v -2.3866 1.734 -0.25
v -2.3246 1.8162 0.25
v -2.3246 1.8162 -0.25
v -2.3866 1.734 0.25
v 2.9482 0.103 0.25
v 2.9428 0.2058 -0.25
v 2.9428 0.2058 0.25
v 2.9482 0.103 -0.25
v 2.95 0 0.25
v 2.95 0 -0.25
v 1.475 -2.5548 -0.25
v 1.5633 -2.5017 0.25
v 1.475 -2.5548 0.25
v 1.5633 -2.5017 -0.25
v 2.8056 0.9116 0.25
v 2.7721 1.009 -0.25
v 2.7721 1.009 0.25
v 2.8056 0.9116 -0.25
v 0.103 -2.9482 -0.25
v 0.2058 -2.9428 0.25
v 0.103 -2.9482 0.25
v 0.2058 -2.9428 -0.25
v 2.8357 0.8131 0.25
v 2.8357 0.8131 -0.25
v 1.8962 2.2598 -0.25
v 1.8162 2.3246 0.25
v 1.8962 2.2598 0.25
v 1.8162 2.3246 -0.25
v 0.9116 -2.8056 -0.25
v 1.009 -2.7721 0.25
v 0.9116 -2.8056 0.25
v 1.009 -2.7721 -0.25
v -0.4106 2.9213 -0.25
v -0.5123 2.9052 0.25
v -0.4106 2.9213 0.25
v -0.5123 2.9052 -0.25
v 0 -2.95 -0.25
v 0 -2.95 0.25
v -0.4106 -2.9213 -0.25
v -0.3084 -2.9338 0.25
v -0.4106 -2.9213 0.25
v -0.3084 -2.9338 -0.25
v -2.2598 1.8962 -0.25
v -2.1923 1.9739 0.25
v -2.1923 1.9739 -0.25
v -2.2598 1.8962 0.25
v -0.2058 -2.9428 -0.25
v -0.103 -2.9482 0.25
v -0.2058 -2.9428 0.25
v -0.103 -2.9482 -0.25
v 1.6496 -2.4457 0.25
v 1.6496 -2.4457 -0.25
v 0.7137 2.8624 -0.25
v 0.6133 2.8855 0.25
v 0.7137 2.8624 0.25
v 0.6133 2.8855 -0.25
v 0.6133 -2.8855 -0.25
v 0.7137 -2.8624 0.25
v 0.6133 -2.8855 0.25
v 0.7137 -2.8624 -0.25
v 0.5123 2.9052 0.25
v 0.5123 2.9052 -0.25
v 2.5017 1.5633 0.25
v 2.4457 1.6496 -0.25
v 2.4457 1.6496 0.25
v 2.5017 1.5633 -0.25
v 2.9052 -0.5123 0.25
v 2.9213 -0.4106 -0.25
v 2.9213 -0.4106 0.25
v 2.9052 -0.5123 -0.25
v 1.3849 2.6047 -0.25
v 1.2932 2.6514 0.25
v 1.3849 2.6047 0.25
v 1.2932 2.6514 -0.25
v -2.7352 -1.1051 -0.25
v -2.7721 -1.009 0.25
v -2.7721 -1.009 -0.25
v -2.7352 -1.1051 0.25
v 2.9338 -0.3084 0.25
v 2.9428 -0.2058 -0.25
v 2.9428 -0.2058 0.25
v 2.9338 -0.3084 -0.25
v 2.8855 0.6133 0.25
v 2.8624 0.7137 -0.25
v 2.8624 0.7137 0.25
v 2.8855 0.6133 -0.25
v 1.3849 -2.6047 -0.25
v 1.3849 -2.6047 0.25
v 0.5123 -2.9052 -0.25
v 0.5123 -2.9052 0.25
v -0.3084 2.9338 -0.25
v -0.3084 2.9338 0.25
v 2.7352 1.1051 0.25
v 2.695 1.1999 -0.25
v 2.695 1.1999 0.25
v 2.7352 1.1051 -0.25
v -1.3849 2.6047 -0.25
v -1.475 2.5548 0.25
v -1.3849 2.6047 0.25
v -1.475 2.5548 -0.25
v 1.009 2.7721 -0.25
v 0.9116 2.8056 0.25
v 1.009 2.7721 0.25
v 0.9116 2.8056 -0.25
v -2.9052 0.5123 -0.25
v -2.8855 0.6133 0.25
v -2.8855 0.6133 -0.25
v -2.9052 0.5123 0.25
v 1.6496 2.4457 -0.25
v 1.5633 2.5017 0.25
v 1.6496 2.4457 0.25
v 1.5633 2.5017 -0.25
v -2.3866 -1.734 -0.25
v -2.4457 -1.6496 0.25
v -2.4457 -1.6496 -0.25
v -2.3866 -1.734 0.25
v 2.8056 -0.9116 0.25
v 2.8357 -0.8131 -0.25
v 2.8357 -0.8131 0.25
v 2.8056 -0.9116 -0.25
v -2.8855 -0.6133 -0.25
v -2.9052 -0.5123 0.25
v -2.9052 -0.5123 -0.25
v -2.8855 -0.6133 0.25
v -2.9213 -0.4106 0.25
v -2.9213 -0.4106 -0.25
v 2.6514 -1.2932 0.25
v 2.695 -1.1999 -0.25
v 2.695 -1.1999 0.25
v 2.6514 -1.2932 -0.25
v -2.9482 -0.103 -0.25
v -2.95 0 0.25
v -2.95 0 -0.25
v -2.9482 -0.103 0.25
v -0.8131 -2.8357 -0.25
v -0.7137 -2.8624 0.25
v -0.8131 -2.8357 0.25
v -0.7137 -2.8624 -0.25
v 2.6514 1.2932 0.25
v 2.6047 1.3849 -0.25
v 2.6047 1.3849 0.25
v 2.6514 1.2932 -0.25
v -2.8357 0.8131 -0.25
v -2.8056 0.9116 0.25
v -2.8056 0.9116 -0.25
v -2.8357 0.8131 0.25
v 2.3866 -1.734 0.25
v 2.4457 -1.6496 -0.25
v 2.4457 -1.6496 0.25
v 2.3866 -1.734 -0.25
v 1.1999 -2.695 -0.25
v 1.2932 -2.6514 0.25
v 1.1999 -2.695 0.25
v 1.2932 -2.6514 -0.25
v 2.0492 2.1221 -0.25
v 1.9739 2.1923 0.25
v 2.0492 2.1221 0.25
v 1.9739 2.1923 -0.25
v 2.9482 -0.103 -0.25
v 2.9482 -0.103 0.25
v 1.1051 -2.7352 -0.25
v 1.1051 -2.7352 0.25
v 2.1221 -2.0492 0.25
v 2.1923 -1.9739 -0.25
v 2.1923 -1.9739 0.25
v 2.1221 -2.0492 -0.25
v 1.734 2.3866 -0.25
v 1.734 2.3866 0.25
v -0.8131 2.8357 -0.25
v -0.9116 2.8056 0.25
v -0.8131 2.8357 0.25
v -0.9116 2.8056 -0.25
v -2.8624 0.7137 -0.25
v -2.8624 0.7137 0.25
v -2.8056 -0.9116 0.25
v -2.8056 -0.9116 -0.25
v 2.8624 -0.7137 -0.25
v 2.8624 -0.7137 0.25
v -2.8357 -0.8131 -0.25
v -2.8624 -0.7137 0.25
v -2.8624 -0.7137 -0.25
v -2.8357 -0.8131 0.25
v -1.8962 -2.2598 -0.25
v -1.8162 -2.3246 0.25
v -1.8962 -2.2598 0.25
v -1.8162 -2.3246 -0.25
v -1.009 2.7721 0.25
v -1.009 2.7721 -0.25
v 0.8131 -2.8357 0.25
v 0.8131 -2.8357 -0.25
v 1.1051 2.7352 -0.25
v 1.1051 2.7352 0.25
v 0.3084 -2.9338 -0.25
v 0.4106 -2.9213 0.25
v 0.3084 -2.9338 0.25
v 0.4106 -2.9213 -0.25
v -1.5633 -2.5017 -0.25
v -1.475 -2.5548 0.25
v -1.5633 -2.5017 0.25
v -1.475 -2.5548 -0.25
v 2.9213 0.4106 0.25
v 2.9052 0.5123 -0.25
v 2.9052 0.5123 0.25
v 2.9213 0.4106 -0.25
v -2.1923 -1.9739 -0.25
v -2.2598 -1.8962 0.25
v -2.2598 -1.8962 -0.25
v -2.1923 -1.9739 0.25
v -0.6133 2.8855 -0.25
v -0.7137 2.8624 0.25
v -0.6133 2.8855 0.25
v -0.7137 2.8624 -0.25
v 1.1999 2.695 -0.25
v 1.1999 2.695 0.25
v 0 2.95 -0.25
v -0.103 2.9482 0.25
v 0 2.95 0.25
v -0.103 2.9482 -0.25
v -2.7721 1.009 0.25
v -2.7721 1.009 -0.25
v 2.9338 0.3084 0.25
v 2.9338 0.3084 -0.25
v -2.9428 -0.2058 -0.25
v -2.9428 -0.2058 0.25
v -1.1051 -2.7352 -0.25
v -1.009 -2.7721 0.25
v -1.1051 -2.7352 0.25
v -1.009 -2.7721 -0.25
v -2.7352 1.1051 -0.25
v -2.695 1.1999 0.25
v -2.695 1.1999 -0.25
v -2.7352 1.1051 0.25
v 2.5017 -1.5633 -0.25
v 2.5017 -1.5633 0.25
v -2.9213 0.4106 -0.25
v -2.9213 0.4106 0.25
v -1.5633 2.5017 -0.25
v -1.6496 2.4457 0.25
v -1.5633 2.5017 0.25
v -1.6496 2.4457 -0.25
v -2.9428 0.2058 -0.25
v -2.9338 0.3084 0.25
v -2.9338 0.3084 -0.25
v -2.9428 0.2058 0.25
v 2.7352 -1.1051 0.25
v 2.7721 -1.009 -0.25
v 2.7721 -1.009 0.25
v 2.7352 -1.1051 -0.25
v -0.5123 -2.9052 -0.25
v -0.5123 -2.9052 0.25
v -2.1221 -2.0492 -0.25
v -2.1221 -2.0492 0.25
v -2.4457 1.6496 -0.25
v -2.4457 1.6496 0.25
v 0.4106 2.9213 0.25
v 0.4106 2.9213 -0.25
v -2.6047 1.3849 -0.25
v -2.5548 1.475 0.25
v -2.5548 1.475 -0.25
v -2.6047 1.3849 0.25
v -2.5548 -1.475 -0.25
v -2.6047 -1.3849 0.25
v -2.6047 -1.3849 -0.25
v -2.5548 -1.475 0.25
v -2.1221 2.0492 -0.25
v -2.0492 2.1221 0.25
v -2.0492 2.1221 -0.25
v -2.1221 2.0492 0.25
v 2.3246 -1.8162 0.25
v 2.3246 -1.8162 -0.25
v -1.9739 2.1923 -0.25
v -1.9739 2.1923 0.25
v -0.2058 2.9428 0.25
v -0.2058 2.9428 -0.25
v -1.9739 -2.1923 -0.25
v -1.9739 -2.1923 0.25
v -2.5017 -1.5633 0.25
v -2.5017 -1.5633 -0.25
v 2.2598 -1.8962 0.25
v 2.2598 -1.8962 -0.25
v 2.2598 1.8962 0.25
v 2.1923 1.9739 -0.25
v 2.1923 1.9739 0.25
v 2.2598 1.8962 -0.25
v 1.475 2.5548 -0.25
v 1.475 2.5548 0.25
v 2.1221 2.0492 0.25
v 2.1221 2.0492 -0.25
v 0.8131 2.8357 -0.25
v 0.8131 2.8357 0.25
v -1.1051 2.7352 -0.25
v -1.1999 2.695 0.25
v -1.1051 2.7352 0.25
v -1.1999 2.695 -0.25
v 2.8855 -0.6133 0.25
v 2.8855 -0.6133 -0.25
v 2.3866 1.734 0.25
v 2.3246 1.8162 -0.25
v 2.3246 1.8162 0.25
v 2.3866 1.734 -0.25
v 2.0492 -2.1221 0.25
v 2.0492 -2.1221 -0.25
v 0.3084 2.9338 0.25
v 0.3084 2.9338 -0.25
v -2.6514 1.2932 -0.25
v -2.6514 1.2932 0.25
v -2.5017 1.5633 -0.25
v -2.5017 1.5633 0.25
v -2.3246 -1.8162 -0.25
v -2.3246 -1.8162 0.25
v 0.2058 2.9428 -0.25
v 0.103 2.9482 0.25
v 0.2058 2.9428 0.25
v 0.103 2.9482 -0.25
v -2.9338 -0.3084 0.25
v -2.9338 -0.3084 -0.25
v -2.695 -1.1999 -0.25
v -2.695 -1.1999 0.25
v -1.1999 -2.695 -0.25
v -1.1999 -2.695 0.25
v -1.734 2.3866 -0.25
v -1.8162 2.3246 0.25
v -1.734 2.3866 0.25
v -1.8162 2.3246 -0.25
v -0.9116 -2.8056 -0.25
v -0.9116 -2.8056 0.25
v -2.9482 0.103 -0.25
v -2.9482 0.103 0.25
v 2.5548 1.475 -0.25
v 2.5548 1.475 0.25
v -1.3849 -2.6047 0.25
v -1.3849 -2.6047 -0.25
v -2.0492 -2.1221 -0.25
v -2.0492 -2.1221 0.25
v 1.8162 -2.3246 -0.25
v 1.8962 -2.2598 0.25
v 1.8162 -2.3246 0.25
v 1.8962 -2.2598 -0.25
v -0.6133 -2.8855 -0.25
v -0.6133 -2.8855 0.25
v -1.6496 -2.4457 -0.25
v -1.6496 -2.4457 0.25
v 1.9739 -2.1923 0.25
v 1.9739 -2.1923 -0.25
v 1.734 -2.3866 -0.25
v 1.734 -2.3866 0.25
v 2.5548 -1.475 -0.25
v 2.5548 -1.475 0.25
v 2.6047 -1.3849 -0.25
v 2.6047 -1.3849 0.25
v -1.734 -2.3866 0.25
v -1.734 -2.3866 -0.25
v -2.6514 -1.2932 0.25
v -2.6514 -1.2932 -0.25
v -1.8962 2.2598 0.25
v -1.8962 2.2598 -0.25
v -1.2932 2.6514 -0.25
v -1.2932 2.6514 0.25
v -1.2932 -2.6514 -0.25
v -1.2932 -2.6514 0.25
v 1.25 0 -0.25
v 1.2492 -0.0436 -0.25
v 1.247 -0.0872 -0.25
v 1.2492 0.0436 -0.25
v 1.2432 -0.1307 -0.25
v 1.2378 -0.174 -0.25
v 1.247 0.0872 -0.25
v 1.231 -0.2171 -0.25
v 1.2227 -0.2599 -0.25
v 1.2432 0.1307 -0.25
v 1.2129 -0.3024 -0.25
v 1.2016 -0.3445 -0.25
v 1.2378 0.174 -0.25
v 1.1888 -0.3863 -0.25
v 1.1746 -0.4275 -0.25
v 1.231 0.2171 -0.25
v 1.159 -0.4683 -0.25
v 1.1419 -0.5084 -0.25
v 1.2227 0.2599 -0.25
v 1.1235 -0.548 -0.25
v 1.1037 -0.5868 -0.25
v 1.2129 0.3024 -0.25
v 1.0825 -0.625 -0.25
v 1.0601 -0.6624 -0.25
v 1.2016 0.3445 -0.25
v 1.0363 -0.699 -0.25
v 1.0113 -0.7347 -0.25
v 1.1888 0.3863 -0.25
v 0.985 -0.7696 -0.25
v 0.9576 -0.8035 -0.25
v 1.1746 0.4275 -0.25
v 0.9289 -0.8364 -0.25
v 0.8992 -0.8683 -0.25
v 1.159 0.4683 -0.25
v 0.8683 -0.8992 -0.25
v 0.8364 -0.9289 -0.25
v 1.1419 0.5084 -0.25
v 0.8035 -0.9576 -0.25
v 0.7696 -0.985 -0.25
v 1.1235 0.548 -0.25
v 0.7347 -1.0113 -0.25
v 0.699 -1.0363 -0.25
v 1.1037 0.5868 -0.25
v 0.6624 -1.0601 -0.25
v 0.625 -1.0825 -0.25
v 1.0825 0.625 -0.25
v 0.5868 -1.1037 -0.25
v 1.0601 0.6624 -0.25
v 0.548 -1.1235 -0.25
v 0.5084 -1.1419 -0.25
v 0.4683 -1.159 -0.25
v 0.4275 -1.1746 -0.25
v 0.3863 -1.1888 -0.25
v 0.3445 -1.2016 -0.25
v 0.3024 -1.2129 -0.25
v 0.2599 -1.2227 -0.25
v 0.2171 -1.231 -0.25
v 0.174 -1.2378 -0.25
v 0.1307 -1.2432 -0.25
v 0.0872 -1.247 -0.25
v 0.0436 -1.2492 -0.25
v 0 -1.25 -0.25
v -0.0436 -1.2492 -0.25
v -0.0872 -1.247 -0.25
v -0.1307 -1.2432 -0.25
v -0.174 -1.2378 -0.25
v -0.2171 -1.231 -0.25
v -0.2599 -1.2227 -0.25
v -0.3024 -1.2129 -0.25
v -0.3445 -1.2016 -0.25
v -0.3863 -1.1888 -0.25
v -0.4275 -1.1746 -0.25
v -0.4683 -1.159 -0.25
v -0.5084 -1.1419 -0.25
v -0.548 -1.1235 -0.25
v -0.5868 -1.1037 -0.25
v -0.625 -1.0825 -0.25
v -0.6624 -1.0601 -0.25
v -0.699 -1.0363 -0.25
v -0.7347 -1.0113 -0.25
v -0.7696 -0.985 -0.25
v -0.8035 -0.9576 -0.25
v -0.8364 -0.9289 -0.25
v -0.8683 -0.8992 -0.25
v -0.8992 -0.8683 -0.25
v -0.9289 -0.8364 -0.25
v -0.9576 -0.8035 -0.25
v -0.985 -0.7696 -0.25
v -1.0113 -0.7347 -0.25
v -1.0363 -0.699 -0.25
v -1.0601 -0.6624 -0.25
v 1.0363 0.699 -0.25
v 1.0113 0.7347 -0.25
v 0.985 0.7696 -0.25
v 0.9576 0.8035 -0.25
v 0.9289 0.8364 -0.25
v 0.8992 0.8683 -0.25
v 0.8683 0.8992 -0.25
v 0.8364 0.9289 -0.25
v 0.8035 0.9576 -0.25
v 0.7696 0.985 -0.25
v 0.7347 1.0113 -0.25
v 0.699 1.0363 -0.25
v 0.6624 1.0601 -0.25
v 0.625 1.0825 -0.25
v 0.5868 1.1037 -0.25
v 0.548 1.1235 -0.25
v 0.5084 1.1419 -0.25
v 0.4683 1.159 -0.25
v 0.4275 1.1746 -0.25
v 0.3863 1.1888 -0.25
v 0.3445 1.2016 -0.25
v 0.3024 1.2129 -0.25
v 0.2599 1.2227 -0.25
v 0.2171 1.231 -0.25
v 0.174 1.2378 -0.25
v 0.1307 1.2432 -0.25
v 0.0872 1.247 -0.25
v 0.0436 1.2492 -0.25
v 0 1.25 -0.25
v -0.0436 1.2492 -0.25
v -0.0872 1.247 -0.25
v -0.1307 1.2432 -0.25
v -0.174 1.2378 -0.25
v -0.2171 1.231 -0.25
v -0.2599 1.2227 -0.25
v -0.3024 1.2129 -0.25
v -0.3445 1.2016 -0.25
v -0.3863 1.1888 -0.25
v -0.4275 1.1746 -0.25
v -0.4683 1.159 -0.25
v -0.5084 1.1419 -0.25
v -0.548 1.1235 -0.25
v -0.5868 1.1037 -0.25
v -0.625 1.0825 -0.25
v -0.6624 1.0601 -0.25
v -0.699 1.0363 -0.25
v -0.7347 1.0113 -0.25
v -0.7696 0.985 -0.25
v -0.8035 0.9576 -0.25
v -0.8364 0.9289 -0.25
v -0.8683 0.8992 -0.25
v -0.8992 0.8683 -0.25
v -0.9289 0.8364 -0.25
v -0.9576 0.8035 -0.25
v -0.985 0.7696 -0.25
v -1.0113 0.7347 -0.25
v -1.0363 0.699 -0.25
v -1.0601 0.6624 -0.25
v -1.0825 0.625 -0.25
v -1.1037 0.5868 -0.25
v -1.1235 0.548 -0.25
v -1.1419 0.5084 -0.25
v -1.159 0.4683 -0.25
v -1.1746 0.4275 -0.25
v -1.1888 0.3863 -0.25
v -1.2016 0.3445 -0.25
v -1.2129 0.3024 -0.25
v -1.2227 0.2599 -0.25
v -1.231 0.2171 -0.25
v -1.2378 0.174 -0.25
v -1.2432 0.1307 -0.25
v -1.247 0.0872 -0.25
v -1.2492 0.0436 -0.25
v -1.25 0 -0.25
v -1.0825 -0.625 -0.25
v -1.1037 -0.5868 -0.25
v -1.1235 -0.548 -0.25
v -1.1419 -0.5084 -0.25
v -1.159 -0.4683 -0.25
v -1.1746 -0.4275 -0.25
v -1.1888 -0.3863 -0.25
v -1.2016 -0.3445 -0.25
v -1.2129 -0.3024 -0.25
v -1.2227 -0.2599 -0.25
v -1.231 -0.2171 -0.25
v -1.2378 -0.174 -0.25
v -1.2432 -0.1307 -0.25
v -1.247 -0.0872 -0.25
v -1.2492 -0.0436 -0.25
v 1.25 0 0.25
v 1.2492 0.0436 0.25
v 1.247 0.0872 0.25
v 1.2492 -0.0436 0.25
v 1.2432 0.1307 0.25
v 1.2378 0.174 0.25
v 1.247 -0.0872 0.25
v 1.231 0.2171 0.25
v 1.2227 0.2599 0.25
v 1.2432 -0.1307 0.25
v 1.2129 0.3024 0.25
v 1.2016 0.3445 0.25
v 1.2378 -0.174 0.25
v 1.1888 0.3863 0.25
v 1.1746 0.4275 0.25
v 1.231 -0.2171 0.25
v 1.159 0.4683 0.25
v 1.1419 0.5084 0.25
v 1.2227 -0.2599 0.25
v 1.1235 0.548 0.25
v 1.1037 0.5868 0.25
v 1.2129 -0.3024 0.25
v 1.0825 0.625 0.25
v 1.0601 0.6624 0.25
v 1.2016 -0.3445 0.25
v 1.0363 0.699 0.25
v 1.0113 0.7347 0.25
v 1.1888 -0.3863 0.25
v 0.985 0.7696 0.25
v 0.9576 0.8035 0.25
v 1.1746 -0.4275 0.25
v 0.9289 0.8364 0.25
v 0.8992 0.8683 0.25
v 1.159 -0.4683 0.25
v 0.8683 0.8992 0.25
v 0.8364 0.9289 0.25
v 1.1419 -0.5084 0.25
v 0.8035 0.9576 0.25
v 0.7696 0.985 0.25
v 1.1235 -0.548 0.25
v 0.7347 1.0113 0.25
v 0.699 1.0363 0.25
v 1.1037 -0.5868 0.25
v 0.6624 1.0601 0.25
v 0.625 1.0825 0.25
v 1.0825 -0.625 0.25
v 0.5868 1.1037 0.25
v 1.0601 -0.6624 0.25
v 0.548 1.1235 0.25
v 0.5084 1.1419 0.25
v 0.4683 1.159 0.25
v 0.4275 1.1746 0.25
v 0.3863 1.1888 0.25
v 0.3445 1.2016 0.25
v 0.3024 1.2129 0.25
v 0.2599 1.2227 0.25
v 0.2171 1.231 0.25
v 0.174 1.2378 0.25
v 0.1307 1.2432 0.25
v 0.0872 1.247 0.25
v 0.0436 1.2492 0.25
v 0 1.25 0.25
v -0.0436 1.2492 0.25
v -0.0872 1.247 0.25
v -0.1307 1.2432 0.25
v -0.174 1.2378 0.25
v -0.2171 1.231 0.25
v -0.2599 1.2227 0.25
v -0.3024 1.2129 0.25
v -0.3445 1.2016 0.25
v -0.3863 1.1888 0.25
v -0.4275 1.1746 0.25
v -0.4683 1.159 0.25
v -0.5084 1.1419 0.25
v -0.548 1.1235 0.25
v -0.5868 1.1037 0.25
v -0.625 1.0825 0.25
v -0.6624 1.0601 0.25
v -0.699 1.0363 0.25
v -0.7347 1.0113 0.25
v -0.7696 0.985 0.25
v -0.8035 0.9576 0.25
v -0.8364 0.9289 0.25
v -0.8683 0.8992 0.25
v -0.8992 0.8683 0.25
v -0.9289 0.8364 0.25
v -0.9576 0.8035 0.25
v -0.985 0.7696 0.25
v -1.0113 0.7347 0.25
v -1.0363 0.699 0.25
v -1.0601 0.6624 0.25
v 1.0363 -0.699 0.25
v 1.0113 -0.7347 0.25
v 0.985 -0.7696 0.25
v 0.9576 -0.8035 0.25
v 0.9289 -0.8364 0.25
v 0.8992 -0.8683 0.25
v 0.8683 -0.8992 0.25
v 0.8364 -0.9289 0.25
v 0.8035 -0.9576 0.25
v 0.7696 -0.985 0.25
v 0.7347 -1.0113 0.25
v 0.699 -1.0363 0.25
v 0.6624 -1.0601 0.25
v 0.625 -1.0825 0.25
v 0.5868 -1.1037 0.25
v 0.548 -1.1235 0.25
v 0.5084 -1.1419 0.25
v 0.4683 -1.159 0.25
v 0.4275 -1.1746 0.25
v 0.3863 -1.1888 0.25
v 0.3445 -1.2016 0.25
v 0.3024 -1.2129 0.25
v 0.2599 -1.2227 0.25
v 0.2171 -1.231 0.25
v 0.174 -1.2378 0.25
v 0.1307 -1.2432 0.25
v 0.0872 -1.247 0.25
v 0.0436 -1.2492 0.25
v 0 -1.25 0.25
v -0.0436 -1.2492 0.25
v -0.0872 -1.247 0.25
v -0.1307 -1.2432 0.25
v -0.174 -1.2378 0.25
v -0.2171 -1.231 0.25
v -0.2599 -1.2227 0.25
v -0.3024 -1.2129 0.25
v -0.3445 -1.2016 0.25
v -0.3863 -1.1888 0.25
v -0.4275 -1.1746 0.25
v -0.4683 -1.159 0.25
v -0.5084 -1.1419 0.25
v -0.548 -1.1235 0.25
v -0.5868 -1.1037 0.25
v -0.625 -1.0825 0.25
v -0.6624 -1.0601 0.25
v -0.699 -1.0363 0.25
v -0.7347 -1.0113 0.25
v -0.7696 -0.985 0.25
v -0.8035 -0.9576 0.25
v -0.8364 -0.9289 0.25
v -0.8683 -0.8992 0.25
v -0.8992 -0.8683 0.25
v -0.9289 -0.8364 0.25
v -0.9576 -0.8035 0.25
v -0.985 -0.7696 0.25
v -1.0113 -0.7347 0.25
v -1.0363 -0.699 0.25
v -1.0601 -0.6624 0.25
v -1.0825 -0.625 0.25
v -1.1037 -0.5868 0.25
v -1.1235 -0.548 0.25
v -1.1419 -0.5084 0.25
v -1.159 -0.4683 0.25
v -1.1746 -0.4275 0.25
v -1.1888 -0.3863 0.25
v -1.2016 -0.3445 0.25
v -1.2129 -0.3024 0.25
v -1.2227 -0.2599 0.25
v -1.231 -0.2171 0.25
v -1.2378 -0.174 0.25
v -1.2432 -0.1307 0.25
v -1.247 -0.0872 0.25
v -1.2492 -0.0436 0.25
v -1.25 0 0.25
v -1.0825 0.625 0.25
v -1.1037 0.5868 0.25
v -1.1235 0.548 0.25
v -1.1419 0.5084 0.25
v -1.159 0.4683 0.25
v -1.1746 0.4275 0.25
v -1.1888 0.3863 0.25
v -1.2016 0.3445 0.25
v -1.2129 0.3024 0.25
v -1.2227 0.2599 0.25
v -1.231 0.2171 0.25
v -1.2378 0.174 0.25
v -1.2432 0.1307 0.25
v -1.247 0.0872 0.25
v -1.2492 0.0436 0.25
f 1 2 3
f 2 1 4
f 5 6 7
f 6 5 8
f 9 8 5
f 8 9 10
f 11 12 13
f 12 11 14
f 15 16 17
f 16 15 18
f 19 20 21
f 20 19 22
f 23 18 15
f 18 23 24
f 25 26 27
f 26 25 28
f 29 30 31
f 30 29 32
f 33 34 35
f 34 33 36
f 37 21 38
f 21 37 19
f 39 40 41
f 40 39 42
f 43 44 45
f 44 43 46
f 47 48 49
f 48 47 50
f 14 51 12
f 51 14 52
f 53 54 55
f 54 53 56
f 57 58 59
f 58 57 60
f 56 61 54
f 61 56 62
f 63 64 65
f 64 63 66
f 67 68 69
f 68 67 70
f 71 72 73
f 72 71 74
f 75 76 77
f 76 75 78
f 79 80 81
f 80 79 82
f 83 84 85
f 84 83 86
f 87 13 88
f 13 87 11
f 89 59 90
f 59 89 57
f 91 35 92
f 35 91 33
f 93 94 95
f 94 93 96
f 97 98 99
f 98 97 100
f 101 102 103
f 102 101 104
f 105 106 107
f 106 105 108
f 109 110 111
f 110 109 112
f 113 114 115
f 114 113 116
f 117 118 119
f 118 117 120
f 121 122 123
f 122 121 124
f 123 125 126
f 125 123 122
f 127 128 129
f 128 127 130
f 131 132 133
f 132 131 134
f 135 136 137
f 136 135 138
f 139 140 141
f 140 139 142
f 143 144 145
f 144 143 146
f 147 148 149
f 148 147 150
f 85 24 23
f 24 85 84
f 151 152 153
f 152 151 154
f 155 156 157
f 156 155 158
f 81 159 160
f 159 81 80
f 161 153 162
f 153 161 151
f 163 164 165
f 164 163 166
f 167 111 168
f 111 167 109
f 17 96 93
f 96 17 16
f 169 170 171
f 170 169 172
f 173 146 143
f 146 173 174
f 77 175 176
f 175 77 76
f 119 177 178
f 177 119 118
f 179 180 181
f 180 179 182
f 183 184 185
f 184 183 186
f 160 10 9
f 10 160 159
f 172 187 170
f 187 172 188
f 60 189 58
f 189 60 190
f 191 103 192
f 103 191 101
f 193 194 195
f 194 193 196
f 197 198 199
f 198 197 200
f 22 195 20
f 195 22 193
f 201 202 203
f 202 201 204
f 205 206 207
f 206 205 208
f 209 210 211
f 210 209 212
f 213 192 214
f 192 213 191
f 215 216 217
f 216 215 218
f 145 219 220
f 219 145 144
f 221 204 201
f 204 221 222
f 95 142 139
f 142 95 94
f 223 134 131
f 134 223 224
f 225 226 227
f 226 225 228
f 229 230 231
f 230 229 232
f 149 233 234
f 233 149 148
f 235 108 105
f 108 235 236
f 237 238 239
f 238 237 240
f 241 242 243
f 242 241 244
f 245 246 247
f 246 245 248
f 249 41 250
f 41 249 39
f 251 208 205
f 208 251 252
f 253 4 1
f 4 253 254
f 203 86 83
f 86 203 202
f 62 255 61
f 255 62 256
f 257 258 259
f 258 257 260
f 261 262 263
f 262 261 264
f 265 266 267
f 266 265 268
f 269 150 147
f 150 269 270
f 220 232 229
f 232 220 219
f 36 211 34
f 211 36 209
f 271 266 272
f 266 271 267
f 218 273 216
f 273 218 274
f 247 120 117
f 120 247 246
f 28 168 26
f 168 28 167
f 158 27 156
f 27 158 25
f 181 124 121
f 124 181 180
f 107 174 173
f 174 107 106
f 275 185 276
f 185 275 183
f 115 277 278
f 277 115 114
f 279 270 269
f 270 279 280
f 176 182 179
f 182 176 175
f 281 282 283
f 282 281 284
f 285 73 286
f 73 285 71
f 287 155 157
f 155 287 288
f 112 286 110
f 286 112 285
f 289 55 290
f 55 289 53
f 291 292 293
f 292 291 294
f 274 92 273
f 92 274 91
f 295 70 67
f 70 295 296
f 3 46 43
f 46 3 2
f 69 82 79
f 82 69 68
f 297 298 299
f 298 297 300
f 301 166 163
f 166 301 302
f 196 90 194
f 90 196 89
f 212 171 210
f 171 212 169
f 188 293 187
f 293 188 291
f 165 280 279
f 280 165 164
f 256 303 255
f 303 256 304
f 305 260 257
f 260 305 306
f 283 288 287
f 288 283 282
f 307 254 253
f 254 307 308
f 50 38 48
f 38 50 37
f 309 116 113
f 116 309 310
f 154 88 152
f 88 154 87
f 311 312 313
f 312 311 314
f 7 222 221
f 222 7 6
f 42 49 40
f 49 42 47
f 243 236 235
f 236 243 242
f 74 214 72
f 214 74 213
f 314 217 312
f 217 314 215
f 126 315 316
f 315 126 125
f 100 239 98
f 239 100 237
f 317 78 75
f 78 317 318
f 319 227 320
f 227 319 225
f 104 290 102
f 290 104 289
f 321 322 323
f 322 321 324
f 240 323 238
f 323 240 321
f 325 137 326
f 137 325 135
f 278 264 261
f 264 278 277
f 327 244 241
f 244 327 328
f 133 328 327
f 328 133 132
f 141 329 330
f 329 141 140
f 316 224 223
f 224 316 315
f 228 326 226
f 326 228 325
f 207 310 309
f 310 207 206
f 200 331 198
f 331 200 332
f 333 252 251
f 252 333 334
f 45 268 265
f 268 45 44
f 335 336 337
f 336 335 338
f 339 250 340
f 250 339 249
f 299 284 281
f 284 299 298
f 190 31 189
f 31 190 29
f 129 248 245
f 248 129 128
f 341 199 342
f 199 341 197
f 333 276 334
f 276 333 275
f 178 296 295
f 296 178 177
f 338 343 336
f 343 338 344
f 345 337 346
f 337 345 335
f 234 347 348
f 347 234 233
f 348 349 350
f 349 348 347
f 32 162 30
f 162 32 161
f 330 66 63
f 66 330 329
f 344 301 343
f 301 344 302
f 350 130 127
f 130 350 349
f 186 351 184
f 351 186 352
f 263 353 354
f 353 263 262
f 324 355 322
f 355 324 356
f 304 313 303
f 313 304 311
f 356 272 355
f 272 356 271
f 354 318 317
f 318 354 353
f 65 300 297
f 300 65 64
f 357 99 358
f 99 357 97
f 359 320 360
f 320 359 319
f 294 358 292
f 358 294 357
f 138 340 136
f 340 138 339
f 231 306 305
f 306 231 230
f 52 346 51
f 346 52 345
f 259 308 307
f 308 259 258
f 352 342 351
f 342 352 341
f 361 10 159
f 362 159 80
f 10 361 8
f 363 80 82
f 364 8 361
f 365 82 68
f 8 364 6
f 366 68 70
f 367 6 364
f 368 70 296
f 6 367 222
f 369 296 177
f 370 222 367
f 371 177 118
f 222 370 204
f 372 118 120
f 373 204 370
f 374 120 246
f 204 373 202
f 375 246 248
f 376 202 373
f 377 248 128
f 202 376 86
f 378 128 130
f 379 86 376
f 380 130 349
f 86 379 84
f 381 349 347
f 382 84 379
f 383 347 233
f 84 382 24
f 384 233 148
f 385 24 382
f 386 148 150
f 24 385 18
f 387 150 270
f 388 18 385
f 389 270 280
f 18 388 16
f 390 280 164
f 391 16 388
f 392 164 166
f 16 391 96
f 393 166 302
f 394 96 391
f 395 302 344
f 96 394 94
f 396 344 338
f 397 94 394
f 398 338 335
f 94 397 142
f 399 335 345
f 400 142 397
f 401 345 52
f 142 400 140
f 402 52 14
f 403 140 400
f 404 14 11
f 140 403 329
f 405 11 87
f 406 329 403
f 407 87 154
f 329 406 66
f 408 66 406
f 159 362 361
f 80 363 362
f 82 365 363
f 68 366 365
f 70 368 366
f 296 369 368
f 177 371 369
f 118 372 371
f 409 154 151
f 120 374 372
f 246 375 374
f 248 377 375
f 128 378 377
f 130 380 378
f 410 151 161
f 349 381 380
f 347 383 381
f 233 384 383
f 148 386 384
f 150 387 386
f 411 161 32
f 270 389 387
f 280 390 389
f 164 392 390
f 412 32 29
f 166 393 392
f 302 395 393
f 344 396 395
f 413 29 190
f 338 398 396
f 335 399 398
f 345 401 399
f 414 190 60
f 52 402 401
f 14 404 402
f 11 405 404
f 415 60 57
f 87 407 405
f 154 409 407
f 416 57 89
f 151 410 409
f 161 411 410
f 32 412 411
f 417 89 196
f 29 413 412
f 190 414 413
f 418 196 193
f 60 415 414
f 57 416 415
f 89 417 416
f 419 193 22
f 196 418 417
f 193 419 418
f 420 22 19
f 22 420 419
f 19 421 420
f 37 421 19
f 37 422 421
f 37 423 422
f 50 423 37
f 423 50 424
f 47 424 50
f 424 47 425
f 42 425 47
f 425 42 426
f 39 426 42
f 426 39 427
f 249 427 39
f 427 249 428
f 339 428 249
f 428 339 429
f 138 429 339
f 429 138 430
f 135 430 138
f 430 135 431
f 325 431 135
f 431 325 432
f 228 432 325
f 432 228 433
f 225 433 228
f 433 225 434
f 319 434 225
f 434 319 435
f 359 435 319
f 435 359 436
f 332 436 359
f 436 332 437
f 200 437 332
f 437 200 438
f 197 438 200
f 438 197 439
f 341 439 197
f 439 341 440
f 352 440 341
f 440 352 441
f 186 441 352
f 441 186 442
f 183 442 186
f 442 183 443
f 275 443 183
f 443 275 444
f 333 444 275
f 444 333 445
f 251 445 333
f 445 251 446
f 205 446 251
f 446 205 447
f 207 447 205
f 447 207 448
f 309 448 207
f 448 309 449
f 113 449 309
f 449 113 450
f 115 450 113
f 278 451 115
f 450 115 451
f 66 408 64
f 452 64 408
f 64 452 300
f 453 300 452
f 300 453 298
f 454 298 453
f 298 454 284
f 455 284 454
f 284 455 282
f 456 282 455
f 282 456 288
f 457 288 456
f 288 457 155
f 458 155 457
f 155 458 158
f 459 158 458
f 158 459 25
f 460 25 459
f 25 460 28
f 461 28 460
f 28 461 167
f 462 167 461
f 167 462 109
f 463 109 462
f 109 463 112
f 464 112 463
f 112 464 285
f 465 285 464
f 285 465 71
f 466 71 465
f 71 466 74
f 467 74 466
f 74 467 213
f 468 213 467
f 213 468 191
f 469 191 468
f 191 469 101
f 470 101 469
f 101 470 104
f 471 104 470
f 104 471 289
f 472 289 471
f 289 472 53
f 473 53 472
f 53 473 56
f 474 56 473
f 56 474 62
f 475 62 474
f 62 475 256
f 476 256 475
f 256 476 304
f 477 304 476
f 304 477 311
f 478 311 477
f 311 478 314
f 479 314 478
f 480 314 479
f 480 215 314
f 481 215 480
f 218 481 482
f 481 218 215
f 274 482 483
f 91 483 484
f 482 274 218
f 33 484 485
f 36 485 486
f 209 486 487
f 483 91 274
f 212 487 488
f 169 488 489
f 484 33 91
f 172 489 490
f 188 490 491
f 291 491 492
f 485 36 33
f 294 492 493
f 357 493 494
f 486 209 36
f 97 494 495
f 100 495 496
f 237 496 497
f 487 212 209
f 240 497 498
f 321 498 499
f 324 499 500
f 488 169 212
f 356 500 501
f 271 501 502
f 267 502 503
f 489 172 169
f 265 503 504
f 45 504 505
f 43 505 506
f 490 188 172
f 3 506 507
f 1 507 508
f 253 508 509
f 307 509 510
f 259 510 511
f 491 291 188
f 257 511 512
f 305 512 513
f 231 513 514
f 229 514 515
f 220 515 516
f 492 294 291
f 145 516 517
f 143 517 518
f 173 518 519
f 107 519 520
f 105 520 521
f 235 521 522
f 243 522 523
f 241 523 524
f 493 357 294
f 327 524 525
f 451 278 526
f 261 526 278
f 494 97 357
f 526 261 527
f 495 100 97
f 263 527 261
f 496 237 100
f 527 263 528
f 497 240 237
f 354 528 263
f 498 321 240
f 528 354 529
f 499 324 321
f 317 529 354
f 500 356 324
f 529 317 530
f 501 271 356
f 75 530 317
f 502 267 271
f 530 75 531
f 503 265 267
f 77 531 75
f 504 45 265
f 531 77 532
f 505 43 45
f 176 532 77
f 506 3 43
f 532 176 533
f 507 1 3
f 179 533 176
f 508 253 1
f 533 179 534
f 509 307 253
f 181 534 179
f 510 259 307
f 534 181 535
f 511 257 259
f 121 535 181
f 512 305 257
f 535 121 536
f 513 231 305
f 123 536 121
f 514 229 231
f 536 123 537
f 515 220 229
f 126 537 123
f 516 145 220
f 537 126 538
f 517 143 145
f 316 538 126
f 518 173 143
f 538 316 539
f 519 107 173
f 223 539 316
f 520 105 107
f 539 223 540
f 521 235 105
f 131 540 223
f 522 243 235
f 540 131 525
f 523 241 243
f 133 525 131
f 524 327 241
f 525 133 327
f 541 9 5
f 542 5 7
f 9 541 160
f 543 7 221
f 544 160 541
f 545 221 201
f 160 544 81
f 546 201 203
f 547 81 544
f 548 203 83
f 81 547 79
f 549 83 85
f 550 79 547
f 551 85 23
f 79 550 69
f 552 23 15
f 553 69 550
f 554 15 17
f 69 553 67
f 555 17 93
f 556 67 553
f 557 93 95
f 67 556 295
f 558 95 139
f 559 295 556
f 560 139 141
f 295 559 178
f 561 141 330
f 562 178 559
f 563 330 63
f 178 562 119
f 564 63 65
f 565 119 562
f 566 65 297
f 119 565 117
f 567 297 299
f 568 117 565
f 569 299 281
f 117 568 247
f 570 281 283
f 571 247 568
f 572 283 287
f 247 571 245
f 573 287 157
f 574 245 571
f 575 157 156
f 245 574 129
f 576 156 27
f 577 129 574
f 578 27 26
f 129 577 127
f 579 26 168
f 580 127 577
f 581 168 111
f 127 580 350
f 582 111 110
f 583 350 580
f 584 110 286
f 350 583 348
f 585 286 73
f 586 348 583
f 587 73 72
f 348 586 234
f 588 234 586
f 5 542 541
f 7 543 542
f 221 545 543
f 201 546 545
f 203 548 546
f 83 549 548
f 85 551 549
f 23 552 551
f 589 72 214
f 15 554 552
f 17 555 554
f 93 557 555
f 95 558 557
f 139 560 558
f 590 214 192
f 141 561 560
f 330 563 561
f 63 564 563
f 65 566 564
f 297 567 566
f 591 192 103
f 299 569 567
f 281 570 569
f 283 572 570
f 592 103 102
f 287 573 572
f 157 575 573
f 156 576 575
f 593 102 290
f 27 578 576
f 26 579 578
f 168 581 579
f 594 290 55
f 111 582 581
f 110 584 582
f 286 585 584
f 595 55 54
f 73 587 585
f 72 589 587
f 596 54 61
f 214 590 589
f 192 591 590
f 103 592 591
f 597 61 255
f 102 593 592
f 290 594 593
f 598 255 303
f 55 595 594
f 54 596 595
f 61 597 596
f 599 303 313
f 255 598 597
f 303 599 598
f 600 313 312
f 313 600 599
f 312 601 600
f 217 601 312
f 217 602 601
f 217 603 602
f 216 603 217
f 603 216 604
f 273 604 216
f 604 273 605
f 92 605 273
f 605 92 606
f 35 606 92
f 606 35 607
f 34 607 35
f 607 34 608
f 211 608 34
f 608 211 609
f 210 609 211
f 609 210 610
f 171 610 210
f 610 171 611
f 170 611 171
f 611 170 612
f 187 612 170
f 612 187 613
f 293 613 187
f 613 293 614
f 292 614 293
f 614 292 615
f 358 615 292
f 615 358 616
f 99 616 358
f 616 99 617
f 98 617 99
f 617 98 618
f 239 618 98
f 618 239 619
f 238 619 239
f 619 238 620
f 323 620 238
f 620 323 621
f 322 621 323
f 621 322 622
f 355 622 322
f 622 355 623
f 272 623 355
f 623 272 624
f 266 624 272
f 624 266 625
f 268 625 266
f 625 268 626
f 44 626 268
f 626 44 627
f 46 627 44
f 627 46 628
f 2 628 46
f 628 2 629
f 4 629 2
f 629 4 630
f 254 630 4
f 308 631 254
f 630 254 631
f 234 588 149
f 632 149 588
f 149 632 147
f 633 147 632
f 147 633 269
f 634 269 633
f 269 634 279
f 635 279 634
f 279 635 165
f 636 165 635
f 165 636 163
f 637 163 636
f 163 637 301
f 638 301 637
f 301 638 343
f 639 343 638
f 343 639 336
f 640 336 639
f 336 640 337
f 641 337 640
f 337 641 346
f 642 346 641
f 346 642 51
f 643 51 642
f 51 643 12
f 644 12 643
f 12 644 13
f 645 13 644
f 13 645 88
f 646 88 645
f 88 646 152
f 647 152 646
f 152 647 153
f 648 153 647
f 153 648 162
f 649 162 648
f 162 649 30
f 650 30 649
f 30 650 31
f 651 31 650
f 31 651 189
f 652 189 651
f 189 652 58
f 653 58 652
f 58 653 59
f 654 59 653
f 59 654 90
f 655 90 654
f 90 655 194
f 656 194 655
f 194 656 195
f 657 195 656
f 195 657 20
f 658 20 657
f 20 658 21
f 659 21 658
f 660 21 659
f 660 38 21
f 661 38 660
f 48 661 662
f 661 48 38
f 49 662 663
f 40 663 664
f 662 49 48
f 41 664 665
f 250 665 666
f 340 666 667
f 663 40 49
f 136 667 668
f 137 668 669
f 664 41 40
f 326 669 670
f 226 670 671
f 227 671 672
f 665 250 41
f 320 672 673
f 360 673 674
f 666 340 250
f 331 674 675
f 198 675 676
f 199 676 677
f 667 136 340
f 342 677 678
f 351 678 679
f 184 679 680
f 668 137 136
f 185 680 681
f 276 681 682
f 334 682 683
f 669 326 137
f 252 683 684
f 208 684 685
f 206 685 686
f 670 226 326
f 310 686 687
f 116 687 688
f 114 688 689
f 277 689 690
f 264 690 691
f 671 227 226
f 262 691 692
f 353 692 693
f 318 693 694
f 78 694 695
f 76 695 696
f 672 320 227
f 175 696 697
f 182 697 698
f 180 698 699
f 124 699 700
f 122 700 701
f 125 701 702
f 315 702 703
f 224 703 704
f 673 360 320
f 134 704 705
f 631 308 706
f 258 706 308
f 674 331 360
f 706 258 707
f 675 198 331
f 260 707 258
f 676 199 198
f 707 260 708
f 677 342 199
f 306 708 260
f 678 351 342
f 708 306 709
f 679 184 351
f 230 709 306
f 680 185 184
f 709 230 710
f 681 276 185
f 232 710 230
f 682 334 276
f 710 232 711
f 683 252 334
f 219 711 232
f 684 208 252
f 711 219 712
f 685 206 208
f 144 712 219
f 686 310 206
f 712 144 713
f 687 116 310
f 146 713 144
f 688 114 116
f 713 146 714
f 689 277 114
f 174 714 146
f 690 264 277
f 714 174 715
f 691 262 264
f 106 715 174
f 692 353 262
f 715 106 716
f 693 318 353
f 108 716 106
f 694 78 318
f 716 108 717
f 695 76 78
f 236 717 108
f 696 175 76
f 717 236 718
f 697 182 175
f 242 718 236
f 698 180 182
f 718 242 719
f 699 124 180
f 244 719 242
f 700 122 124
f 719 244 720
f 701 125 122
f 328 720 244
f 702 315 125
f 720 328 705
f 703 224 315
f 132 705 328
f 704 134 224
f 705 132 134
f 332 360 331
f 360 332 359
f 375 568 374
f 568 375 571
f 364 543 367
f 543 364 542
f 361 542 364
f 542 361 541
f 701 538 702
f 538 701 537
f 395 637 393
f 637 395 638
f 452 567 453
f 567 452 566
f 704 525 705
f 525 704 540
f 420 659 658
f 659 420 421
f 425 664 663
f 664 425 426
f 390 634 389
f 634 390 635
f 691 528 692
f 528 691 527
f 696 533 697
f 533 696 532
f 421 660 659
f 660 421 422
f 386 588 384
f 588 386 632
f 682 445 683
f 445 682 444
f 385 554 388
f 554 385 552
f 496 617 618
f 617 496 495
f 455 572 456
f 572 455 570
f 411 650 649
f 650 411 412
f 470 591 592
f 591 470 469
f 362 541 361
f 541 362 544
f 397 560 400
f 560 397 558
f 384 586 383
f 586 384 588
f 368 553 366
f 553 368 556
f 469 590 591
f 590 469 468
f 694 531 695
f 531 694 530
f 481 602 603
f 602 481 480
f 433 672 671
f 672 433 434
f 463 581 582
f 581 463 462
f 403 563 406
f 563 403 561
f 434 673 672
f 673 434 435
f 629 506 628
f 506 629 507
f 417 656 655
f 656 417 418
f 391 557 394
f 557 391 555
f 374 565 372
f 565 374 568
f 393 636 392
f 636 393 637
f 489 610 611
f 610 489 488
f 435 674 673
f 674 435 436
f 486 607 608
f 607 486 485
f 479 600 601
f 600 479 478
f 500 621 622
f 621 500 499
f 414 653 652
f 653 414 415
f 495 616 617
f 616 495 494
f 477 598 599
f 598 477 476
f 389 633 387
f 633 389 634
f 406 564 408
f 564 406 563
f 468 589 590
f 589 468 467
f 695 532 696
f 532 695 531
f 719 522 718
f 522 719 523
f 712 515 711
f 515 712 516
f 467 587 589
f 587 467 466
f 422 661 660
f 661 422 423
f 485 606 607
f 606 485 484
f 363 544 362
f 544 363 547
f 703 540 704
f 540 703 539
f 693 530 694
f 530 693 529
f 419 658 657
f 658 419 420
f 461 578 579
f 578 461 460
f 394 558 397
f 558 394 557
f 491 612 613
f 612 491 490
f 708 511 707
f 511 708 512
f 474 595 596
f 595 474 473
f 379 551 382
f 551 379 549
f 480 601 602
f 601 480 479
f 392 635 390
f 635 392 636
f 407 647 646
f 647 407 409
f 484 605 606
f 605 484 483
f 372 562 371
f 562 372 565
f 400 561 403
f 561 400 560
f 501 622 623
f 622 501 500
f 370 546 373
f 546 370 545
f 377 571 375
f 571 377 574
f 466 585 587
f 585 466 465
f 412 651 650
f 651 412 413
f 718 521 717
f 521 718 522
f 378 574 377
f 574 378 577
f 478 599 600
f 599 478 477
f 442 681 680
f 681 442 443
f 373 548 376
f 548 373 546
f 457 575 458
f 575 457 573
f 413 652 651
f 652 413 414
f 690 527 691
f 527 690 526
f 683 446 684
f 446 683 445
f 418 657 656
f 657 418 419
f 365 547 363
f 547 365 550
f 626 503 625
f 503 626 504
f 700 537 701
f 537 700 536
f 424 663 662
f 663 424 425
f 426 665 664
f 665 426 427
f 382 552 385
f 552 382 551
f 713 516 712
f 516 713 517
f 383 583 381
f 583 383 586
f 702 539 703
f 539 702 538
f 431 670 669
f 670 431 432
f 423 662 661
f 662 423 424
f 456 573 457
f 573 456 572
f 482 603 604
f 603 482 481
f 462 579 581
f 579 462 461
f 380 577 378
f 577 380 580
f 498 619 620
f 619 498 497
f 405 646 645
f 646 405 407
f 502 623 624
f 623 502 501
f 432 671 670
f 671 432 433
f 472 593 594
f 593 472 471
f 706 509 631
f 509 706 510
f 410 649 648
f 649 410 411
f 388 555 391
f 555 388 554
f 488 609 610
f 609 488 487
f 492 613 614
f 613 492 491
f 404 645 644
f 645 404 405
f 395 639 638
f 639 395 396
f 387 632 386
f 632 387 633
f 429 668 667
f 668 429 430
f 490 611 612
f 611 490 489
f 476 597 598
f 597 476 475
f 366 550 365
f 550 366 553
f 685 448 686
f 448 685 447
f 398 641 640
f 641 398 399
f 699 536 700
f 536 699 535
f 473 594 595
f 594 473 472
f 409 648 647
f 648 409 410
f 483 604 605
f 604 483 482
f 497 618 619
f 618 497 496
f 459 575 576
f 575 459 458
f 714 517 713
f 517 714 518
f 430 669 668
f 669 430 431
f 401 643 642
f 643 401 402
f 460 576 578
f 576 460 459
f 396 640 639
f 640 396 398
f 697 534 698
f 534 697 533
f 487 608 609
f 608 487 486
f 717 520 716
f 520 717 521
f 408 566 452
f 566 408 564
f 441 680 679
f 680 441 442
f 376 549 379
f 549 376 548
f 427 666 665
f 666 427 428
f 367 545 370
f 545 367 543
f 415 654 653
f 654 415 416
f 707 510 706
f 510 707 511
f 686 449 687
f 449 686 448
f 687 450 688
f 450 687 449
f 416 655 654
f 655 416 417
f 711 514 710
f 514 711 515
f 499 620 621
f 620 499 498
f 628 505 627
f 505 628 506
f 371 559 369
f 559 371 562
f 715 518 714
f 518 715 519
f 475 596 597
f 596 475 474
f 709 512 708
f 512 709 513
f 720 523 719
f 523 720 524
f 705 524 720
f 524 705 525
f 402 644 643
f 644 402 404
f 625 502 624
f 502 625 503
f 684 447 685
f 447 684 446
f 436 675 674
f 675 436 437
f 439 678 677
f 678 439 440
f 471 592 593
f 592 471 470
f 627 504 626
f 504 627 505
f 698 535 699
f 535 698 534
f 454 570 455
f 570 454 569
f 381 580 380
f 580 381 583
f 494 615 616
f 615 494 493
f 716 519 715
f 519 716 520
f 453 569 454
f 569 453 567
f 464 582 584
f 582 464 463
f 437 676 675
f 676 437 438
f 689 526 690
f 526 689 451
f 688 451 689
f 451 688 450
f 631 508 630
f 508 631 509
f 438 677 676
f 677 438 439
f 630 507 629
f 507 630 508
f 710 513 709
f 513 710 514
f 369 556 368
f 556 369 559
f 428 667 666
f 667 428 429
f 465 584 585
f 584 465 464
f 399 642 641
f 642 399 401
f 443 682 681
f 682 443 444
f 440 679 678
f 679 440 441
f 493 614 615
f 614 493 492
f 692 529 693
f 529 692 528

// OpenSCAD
// Flat washer: 2.5mm ID, 5.9mm OD, 0.5mm thickness (single connected solid)

// Parameters
inner_diameter_mm = 2.5;
outer_diameter_mm = 5.9;
thickness_mm      = 0.5;

// Smoothness (prevents polygonal/octagon look)
$fn = 180;

module washer() {
    difference() {
        cylinder(d = outer_diameter_mm, h = thickness_mm, center = true);
        // Slightly taller cutter guarantees a clean through-hole
        cylinder(d = inner_diameter_mm, h = thickness_mm + 0.2, center = true);
    }
}

washer();
